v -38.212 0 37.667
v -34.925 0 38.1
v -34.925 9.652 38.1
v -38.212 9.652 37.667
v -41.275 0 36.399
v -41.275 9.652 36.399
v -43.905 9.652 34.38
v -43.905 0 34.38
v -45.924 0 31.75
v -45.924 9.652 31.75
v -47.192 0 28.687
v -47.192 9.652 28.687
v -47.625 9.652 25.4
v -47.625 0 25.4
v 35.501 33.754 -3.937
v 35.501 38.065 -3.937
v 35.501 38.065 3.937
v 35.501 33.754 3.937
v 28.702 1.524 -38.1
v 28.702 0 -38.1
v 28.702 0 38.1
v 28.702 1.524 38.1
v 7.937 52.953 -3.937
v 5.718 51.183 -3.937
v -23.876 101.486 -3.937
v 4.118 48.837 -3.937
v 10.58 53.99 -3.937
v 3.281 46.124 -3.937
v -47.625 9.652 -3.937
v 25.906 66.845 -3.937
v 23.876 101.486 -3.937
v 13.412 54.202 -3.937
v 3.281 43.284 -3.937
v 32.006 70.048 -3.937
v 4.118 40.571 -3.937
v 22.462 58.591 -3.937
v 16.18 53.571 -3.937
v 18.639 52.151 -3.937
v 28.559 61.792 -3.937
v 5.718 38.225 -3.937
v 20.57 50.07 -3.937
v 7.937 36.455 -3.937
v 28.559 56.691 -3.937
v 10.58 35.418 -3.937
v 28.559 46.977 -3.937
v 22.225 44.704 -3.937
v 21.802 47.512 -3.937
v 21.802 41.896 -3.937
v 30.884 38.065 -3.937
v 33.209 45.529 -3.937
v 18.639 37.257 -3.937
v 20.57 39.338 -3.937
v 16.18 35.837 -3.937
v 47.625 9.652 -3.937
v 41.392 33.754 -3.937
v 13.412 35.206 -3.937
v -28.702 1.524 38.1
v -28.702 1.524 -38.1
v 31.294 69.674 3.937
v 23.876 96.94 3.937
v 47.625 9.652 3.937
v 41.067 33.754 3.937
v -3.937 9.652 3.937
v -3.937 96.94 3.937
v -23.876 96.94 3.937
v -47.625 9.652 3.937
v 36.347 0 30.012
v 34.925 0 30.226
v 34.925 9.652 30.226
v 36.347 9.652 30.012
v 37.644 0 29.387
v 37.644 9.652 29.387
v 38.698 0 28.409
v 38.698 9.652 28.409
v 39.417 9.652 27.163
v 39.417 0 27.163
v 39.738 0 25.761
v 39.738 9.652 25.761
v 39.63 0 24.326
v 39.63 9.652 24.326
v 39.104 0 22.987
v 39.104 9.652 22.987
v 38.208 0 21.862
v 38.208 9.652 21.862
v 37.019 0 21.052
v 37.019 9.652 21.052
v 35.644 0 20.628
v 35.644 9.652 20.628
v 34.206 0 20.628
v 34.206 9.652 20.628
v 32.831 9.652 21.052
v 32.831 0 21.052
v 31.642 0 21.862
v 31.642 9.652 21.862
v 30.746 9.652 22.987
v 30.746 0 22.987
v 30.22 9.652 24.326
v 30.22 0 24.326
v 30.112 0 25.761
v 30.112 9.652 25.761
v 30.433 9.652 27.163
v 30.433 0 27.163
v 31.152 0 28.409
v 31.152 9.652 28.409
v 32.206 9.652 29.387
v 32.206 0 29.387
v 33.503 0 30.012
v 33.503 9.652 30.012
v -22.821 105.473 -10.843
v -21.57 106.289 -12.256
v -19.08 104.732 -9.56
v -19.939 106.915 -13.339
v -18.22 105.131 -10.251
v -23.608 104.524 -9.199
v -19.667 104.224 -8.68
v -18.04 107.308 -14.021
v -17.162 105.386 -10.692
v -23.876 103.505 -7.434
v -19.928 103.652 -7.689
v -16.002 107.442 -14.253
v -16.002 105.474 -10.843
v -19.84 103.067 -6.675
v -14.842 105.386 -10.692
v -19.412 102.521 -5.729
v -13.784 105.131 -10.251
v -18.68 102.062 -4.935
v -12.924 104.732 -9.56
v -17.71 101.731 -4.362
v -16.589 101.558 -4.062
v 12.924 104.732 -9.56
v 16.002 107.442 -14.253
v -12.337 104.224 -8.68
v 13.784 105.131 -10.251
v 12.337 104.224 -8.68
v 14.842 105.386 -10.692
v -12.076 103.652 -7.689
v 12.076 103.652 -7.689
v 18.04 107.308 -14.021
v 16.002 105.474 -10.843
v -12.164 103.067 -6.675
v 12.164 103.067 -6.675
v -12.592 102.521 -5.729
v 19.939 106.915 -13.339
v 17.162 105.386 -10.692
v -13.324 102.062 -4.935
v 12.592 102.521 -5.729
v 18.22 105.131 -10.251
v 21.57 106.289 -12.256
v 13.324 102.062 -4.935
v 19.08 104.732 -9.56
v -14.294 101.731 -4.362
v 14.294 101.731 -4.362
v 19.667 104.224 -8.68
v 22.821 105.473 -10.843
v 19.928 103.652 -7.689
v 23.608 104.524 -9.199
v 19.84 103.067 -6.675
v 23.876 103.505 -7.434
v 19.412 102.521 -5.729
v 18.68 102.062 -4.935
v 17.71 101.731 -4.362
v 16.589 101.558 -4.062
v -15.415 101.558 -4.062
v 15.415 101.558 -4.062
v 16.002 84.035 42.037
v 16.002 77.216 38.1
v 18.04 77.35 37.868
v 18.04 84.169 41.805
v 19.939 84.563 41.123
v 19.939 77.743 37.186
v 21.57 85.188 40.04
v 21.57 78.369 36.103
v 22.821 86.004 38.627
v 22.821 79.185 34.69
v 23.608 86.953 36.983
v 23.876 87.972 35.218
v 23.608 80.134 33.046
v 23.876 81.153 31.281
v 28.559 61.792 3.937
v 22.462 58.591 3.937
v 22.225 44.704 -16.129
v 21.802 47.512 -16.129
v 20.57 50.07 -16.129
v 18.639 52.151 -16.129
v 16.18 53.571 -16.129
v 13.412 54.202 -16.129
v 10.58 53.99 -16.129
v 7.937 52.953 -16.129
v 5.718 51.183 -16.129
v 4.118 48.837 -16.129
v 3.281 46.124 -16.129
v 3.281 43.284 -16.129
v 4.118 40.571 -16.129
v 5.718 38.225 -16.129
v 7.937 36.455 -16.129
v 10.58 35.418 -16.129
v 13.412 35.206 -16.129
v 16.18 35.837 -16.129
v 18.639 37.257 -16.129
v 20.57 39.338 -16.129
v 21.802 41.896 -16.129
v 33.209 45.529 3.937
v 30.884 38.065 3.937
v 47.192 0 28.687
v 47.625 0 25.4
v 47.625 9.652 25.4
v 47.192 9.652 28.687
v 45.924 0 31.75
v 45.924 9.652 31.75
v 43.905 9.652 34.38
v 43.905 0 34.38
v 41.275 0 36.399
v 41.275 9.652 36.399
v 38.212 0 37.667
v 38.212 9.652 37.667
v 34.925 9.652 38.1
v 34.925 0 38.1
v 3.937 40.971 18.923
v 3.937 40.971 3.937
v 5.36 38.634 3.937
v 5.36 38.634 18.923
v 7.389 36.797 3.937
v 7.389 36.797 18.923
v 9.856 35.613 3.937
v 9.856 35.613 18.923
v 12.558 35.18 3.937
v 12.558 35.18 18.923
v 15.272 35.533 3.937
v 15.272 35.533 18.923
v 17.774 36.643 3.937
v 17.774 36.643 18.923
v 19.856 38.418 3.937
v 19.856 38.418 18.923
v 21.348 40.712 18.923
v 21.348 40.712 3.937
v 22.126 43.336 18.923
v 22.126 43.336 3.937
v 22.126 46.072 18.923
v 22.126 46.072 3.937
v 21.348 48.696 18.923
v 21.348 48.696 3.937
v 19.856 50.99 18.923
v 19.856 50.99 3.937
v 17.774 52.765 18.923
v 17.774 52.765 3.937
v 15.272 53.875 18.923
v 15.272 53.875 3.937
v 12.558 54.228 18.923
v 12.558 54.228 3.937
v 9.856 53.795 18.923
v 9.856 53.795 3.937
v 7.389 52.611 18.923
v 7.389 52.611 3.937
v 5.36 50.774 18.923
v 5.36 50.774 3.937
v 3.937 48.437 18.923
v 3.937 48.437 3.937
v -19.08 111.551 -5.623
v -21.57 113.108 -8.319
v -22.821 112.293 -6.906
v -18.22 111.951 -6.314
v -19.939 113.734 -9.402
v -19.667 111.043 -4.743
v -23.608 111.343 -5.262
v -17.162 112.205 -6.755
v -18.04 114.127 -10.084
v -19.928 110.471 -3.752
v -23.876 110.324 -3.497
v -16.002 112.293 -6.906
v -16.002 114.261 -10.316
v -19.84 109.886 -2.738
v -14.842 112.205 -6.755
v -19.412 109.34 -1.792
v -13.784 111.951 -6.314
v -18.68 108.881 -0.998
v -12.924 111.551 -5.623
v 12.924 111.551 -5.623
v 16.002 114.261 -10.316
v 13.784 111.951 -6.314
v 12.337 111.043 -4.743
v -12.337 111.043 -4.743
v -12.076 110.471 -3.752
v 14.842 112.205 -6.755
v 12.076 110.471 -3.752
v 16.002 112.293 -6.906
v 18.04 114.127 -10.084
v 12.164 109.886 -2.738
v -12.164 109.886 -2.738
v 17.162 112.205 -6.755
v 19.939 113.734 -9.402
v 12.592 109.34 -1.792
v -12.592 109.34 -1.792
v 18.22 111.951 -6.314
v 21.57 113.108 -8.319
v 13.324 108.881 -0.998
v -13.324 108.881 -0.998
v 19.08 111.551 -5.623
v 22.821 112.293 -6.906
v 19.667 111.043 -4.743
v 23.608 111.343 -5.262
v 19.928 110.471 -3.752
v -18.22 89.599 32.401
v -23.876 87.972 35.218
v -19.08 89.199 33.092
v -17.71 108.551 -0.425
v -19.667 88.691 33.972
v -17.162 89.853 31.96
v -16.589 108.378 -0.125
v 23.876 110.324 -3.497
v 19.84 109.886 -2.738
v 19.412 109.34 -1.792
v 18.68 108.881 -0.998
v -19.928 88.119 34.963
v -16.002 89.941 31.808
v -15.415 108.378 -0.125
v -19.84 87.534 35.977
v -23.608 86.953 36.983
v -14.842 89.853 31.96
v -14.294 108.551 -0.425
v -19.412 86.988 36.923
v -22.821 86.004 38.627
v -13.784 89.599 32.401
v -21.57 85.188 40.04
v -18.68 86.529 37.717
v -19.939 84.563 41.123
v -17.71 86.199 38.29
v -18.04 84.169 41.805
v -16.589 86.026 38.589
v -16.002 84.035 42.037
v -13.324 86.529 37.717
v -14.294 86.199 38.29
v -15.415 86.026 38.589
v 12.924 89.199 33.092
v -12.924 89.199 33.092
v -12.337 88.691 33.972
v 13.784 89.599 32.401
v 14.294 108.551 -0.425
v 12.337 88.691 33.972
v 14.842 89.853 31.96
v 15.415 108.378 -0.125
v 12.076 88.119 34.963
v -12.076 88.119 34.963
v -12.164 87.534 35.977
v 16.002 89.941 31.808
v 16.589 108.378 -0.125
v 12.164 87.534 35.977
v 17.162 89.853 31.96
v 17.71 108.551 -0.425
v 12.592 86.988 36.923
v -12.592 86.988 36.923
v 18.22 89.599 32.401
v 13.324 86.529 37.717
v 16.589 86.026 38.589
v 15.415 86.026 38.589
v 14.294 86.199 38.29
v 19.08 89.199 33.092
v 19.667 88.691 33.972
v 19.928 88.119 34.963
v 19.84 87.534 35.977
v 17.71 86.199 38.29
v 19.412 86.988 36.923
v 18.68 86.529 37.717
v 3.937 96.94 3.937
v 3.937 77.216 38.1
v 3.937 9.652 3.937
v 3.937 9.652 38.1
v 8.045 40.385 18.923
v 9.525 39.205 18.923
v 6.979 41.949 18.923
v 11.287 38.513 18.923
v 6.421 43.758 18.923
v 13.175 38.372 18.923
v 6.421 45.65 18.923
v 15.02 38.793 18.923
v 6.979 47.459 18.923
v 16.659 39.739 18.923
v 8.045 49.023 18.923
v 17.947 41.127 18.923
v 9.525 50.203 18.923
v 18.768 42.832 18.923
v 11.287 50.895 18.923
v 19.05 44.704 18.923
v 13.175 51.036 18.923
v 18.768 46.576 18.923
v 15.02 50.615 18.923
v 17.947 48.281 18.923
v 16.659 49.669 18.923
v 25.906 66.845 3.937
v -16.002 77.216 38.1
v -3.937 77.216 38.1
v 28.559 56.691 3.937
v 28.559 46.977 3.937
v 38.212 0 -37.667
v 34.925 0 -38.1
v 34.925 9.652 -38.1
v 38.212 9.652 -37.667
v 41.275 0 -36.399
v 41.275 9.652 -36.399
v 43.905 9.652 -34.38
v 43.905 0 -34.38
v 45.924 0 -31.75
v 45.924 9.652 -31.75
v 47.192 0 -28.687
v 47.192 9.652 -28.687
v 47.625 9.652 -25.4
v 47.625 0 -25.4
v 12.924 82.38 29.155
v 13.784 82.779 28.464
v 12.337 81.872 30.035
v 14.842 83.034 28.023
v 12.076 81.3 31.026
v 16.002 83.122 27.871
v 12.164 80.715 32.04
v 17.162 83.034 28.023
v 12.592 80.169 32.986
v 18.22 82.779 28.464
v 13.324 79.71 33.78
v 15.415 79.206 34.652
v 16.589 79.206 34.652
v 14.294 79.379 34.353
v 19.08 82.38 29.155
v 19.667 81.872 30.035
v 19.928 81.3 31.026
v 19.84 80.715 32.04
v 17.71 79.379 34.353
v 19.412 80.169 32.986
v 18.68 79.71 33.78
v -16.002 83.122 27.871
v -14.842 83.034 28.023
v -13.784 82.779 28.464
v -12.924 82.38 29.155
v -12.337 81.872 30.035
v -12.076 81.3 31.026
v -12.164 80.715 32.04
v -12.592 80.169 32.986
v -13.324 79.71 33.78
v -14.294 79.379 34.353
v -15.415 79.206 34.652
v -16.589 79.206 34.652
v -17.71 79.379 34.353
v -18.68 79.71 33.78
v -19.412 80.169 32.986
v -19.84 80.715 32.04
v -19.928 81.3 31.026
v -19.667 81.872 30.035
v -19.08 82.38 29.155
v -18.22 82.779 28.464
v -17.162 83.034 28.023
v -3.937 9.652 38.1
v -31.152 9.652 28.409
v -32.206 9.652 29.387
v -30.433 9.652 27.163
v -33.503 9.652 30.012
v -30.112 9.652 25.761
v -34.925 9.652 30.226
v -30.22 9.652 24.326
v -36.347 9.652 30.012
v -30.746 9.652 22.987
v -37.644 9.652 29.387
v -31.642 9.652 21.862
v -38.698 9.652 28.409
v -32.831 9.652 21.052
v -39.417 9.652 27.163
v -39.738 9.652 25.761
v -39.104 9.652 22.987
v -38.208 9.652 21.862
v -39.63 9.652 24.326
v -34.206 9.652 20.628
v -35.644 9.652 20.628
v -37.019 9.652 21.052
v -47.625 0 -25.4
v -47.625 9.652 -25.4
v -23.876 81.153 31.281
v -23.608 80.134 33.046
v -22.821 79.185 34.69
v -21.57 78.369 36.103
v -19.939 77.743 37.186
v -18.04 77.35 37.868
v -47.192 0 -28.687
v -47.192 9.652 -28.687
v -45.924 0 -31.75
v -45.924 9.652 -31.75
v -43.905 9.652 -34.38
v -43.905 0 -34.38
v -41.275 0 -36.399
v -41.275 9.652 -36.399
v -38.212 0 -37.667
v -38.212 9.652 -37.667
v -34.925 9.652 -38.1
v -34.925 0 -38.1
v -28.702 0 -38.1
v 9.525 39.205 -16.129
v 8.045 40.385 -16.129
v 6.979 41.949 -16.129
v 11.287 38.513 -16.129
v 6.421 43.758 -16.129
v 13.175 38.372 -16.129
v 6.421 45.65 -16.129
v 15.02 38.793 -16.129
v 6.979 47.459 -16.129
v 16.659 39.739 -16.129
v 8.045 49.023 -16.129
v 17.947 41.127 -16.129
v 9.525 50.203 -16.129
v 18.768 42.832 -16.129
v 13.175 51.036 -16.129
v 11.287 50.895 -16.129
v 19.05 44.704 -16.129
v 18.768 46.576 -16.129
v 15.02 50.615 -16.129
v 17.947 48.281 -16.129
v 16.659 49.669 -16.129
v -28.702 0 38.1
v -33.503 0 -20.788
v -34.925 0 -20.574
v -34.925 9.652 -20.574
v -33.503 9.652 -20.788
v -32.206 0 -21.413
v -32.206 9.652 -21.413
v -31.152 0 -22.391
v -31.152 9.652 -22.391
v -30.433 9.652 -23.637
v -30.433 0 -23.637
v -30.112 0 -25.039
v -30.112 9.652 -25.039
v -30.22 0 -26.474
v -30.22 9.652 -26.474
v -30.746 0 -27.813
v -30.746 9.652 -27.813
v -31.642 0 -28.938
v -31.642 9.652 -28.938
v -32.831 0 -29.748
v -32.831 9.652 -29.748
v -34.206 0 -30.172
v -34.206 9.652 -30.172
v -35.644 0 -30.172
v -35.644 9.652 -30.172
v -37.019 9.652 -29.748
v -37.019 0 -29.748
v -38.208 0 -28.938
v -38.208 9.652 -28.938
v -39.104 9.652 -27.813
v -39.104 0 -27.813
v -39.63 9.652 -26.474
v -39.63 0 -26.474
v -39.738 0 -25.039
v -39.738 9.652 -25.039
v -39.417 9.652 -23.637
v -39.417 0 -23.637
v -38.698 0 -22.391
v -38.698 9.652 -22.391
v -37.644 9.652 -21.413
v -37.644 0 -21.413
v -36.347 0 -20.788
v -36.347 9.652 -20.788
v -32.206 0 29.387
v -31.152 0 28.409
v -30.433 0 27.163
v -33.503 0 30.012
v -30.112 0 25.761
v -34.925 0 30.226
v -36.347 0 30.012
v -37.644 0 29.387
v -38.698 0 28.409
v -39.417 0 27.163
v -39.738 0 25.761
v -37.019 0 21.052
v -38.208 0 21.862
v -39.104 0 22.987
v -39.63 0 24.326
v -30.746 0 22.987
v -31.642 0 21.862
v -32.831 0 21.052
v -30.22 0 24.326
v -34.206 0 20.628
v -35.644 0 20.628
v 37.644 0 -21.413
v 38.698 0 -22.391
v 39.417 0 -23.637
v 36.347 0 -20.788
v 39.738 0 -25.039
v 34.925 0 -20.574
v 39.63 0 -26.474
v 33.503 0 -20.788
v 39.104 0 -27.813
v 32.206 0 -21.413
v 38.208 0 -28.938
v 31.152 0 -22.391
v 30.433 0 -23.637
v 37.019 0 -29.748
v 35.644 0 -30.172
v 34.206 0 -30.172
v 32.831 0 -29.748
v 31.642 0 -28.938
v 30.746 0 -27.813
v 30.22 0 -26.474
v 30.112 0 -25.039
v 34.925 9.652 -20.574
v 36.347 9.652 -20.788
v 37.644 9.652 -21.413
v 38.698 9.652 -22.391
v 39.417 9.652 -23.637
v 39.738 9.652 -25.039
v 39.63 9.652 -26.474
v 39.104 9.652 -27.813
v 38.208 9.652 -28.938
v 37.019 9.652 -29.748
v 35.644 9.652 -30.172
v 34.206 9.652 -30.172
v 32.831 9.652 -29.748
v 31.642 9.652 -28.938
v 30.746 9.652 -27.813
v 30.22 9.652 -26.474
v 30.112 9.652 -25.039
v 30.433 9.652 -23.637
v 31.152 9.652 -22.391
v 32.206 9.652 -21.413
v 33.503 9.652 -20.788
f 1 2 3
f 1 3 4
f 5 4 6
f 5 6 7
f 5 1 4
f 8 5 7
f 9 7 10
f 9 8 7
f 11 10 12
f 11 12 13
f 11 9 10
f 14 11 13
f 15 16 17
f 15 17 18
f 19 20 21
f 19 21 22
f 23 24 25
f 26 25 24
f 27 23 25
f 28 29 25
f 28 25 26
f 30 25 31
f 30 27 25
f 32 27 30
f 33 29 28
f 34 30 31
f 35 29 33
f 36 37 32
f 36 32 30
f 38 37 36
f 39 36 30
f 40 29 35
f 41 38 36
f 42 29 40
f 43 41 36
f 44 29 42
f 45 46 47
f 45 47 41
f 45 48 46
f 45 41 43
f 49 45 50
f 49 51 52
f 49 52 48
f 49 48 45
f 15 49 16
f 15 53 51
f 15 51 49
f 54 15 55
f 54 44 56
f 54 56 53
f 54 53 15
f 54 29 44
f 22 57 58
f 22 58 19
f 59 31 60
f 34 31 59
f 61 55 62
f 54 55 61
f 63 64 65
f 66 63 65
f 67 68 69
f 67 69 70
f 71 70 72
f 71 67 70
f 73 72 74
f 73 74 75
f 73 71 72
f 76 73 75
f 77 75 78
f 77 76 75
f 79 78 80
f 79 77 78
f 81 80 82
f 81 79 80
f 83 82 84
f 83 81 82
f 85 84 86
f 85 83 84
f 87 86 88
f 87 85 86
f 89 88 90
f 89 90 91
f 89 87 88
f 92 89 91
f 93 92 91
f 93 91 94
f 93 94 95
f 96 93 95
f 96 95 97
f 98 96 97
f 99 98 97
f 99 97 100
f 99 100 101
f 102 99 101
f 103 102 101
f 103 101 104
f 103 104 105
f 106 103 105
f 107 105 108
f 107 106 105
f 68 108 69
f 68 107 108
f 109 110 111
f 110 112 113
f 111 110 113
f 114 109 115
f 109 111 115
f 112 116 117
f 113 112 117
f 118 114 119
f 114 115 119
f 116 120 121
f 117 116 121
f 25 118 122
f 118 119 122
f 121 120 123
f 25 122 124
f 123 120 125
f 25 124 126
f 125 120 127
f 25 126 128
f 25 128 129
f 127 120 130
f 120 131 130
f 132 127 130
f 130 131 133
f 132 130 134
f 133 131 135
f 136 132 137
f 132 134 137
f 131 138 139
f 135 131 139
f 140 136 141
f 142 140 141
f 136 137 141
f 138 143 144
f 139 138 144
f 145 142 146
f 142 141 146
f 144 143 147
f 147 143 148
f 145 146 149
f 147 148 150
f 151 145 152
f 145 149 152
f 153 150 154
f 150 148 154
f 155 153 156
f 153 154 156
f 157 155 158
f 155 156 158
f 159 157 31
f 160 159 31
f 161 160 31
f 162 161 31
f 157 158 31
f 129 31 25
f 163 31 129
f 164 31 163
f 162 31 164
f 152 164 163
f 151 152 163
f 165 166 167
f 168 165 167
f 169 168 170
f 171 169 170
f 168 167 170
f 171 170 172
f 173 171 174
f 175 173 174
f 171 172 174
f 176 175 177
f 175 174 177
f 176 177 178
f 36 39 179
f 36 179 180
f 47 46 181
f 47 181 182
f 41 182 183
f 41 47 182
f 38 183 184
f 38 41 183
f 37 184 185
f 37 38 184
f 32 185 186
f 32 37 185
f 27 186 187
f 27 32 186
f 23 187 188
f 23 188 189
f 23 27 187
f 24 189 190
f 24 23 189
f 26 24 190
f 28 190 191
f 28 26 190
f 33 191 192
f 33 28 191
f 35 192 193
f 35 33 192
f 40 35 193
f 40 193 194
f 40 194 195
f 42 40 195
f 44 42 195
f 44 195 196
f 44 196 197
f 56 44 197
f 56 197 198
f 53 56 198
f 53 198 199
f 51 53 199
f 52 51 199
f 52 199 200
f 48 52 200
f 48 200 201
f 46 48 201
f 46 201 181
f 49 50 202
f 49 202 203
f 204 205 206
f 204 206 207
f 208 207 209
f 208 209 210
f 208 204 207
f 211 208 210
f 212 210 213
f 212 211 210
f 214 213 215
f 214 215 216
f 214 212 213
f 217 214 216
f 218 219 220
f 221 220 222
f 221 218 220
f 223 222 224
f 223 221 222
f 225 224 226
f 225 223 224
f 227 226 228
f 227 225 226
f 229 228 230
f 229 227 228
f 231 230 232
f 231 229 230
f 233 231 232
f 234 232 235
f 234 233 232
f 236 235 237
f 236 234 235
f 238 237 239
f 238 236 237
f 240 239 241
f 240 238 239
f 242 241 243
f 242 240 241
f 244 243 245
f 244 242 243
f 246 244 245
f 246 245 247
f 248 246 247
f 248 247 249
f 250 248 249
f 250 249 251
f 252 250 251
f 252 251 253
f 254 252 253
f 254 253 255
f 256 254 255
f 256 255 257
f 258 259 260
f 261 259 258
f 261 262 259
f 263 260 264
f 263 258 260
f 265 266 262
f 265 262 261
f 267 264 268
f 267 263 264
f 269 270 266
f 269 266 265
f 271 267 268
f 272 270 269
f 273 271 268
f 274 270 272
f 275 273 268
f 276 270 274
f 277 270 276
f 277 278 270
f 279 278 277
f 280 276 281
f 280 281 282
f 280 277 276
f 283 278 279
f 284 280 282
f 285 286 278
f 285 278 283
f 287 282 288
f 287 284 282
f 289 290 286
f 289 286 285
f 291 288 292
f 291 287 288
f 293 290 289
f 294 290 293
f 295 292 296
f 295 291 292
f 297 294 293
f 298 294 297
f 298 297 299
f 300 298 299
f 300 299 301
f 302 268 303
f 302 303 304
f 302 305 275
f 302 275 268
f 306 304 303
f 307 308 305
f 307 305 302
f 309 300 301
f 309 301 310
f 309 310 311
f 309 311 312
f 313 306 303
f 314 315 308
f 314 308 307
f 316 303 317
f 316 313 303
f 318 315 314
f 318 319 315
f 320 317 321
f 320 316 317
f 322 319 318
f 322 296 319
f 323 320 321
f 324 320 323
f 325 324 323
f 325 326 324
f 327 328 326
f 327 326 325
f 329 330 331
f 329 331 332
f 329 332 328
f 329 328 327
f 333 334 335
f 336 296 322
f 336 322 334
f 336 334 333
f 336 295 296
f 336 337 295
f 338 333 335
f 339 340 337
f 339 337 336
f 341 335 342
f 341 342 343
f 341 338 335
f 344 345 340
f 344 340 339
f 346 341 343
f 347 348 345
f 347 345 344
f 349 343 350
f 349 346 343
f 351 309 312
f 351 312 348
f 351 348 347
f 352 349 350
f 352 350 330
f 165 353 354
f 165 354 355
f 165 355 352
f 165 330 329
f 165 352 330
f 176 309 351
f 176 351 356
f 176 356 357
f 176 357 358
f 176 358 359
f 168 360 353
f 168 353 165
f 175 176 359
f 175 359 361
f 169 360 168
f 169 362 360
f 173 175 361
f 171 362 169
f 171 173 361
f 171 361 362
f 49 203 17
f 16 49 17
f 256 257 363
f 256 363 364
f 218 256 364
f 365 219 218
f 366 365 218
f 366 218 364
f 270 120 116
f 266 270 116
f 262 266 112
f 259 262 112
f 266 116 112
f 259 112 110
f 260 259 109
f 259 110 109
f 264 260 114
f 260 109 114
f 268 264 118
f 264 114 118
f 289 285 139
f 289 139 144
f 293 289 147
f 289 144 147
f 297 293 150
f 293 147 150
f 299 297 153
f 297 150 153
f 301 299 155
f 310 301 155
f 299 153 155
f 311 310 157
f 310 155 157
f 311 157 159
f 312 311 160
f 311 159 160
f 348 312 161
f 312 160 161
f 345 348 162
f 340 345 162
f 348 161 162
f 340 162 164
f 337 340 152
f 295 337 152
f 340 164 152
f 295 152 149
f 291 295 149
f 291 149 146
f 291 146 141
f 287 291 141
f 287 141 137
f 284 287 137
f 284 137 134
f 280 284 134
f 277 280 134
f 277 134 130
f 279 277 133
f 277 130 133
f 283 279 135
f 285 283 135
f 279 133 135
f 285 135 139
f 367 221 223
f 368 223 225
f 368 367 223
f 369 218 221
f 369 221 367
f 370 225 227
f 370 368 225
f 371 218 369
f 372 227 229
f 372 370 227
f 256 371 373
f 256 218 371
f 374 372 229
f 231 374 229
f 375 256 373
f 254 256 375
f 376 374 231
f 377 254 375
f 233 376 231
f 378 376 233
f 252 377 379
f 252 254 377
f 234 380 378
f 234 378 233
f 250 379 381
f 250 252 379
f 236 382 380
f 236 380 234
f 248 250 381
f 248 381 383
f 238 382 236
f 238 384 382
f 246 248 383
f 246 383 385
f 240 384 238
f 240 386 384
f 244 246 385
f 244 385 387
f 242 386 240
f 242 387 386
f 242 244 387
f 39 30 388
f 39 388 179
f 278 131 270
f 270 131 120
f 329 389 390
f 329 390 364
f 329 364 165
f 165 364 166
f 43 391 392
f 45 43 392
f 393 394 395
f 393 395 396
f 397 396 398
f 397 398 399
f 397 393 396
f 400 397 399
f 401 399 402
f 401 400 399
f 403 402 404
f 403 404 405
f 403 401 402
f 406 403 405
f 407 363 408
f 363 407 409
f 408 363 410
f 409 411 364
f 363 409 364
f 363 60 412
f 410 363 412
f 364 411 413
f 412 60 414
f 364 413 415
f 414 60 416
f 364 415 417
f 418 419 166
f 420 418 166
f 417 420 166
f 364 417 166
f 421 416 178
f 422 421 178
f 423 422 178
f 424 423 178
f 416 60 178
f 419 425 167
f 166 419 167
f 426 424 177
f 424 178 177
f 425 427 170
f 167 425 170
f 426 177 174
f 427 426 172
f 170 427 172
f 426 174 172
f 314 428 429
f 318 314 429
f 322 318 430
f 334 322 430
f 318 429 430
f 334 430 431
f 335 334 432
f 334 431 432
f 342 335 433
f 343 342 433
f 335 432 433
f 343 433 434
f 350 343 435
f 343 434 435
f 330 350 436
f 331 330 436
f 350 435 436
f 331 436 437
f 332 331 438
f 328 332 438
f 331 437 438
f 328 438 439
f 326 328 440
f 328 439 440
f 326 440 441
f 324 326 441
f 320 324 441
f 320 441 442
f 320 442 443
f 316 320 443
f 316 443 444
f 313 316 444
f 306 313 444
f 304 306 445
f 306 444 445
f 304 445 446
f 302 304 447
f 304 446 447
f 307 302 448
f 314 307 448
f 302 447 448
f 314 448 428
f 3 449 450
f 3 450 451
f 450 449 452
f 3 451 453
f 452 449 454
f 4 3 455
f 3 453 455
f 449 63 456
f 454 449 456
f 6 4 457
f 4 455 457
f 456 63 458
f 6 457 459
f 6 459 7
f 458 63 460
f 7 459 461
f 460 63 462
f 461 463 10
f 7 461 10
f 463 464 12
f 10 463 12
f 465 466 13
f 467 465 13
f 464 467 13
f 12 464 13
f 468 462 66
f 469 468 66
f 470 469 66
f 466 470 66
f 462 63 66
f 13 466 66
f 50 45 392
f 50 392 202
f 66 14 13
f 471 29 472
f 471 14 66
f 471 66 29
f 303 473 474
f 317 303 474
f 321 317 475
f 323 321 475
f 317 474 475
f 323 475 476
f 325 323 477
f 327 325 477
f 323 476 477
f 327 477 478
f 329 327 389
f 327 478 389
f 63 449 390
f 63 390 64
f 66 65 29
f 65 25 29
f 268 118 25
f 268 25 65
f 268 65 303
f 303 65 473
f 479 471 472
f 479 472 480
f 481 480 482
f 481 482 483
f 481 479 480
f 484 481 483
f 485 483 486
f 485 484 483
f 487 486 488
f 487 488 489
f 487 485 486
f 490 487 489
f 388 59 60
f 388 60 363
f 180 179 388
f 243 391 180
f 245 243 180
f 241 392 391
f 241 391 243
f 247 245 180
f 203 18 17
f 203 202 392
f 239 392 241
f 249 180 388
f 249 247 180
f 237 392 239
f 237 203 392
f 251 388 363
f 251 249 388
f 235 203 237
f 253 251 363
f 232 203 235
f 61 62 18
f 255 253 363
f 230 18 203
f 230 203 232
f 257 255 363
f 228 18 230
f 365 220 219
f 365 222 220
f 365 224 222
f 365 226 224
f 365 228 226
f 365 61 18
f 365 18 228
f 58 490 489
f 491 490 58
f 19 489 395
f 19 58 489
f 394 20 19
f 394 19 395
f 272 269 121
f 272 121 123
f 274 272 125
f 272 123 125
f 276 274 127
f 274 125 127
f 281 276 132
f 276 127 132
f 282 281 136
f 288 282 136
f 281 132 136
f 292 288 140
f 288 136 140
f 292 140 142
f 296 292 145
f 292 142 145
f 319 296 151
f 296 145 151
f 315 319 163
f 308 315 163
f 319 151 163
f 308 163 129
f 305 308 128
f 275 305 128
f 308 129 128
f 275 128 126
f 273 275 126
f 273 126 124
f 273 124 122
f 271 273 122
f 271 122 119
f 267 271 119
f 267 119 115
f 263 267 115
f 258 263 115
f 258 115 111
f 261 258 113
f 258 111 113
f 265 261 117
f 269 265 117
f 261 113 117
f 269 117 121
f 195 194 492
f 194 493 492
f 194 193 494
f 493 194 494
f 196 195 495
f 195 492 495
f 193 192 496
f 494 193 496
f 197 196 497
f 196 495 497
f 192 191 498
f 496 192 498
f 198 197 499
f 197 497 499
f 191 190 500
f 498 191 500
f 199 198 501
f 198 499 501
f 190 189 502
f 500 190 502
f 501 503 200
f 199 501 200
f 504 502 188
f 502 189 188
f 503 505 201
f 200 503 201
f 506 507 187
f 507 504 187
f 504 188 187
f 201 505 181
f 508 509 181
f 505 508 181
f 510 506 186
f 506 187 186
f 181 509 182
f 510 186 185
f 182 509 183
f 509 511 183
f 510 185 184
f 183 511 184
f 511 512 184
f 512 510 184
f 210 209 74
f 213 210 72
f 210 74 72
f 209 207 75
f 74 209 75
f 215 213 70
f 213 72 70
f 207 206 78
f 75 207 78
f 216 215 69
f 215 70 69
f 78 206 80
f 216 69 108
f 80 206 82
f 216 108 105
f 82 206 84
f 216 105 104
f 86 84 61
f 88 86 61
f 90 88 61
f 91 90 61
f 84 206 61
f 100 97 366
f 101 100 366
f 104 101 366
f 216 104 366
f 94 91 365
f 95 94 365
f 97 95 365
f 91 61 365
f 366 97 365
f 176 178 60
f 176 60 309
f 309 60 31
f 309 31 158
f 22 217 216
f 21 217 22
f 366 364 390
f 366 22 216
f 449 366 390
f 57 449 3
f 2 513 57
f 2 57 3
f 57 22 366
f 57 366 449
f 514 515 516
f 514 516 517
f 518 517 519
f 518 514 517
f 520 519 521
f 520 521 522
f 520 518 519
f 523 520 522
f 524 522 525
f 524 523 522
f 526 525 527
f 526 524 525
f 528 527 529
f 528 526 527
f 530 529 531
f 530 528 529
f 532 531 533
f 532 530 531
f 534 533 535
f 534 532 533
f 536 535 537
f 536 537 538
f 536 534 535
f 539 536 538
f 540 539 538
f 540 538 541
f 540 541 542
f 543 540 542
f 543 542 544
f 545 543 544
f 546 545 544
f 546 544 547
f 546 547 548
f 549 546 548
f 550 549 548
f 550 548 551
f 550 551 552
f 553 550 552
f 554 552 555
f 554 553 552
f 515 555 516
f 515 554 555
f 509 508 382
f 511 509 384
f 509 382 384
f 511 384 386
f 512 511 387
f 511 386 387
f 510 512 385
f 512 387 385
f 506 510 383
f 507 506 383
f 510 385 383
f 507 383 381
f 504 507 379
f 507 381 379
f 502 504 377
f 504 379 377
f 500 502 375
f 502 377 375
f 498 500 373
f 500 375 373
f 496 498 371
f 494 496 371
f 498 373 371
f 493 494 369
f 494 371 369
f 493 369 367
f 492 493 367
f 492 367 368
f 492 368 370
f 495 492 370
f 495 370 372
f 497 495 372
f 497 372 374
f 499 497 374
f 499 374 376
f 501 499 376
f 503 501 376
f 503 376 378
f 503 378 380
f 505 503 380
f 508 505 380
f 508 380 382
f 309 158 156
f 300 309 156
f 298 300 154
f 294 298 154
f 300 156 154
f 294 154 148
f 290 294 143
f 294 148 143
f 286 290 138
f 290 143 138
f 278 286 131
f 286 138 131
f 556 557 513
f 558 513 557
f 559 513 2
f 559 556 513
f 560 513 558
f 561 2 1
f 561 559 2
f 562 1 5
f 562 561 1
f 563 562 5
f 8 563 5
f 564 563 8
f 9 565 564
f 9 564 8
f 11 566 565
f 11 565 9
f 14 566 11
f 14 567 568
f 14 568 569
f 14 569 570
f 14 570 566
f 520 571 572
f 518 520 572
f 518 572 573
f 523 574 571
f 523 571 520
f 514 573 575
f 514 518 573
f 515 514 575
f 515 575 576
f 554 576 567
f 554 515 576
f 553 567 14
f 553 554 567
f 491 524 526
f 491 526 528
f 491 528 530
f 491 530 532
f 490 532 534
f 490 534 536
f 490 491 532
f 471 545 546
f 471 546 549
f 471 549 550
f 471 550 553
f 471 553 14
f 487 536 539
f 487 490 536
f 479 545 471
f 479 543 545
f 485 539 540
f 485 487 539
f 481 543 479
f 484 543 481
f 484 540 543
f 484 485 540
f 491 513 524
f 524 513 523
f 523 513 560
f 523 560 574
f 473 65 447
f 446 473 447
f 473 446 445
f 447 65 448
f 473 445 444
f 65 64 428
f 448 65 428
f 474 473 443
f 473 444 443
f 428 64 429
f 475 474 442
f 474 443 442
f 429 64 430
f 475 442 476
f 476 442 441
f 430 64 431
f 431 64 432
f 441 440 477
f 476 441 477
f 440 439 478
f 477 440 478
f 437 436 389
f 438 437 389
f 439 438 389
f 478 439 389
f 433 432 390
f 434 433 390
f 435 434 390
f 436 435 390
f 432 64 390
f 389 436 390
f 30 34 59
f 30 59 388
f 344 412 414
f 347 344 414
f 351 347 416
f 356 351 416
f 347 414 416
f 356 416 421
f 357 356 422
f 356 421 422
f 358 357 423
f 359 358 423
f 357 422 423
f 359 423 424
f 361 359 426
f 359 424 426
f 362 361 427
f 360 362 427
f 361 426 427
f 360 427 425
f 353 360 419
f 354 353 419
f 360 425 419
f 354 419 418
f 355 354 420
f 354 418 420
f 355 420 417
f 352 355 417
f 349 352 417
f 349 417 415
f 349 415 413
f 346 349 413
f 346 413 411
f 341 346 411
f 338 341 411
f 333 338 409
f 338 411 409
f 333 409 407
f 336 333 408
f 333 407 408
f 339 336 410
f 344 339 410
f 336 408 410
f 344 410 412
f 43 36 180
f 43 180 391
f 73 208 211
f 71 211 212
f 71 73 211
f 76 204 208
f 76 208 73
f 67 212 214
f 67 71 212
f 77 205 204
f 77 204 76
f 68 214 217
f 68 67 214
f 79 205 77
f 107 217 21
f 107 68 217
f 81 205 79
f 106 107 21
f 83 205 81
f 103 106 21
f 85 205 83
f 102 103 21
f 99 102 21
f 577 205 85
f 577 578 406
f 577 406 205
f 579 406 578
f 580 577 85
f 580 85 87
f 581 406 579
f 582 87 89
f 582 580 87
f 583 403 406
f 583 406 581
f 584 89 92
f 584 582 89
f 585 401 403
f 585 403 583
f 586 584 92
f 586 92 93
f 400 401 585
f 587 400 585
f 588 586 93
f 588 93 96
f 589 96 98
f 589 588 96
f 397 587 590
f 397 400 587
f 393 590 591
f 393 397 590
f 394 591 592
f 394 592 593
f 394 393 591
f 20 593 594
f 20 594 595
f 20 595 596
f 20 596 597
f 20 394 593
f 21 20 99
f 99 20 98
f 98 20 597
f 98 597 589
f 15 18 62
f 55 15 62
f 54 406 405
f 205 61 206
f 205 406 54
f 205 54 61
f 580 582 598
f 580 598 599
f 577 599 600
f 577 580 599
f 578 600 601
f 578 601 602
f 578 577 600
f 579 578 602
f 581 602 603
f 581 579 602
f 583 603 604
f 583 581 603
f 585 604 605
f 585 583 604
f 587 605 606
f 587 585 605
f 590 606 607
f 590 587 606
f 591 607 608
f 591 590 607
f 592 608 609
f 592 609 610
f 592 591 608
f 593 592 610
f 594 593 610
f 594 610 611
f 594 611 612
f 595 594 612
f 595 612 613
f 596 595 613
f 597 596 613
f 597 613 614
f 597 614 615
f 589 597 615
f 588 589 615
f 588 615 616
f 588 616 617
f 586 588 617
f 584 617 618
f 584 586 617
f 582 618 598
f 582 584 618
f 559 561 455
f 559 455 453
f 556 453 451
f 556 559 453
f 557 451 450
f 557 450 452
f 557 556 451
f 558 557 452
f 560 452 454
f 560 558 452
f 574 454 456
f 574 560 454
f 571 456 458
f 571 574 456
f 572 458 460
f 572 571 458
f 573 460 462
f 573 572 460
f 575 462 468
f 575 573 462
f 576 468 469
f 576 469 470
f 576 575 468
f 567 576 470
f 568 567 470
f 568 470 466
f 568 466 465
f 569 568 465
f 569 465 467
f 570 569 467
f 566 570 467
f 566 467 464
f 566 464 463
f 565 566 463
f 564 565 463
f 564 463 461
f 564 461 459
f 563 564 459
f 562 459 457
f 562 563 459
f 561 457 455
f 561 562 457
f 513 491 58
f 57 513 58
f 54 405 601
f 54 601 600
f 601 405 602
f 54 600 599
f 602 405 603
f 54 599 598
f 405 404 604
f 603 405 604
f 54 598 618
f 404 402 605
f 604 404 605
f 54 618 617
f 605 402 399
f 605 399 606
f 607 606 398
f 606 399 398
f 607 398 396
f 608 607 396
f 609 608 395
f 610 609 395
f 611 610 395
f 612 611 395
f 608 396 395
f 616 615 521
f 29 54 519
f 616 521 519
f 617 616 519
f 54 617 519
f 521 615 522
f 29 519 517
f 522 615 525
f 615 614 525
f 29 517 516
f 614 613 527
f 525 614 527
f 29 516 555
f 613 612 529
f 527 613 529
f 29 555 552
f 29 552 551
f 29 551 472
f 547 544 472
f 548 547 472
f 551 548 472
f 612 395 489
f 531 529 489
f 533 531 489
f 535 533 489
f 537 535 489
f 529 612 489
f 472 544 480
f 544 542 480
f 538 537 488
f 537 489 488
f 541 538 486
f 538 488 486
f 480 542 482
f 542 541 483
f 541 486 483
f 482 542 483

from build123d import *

# Parameters (mm, degrees)
CROQUIS1_R              = 4.826
SALIENTE_EXTRUIR1_DEPTH = 9.652
CROQUIS2_W              = 57.404
CROQUIS2_H              = 1.524
CORTAR_EXTRUIR1_DEPTH   = 91.375559356
CROQUIS4_R              = 3.937
SALIENTE_EXTRUIR2_DEPTH = 7.874
SALIENTE_EXTRUIR3_REACH = 207.578
SALIENTE_EXTRUIR4_START = 14.986
CROQUIS8_R              = 9.525
CROQUIS8_R_2            = 6.35
SALIENTE_EXTRUIR4_DEPTH = 35.052
CROQUIS8_2_R            = 6.35
CORTAR_EXTRUIR2_DEPTH   = 131.731959853
CORTAR_EXTRUIR3_DEPTH   = 131.731959853


with BuildPart() as part:
    # Croquis1 → Saliente-Extruir1 (new body)
    with BuildSketch(Plane(origin=(0, 0, 0), x_dir=(1, 0, 0), z_dir=(0, 1, 0))):
        with BuildLine():
            Line((-34.925, 38.1), (34.925, 38.1))
            ThreePointArc((34.925, 38.1), (43.905256121, 34.380256121), (47.625, 25.4))
            Line((47.625, 25.4), (47.625, -25.4))
            ThreePointArc((47.625, -25.4), (43.905256121, -34.380256121), (34.925, -38.1))
            Line((34.925, -38.1), (-34.925, -38.1))
            ThreePointArc((-34.925, -38.1), (-43.905256121, -34.380256121), (-47.625, -25.4))
            Line((-47.625, -25.4), (-47.625, 25.4))
            ThreePointArc((-47.625, 25.4), (-43.905256121, 34.380256121), (-34.925, 38.1))
        make_face()
        with Locations((-34.925, 25.4)):
            Circle(CROQUIS1_R, mode=Mode.SUBTRACT)
        with Locations((34.925, 25.4)):
            Circle(CROQUIS1_R, mode=Mode.SUBTRACT)
        with Locations((-34.925, -25.4)):
            Circle(CROQUIS1_R, mode=Mode.SUBTRACT)
        with Locations((34.925, -25.4)):
            Circle(CROQUIS1_R, mode=Mode.SUBTRACT)
    extrude(amount=SALIENTE_EXTRUIR1_DEPTH)

    # Croquis2 → Cortar-Extruir1 (cut, through all)
    with BuildSketch(Plane.XY.offset(38.1)):
        with Locations((0, 0.762)):
            Rectangle(CROQUIS2_W, CROQUIS2_H)
    extrude(amount=-CORTAR_EXTRUIR1_DEPTH, mode=Mode.SUBTRACT)



with BuildPart() as body_2:
    # Croquis4 → Saliente-Extruir2 (new body)
    with BuildSketch(Plane(origin=(0, 74.409783942, 42.960508789), x_dir=(0, 0.5000000000000009, -0.866025403784438), z_dir=(0, -0.8660254037844382, -0.500000000000001))):
        with BuildLine():
            Line((58.190432116, -23.876), (13.486432116, -23.876))
            ThreePointArc((13.486432116, -23.876), (7.918673321, -21.569758795), (5.612432116, -16.002))
            Line((5.612432116, -16.002), (5.612432116, 16.002))
            ThreePointArc((5.612432116, 16.002), (7.918673321, 21.569758795), (13.486432116, 23.876))
            Line((13.486432116, 23.876), (58.190432116, 23.876))
            ThreePointArc((58.190432116, 23.876), (63.758190911, 21.569758795), (66.064432116, 16.002))
            Line((66.064432116, 16.002), (66.064432116, -16.002))
            ThreePointArc((66.064432116, -16.002), (63.758190911, -21.569758795), (58.190432116, -23.876))
        make_face()
        with Locations((58.190432116, -16.002)):
            Circle(CROQUIS4_R, mode=Mode.SUBTRACT)
        with Locations((13.486432116, 16.002)):
            Circle(CROQUIS4_R, mode=Mode.SUBTRACT)
        with Locations((13.486432116, -16.002)):
            Circle(CROQUIS4_R, mode=Mode.SUBTRACT)
        with Locations((58.190432116, 16.002)):
            Circle(CROQUIS4_R, mode=Mode.SUBTRACT)
    extrude(amount=-SALIENTE_EXTRUIR2_DEPTH)


with BuildPart() as part_1:
    add(part.part)

    add(body_2.part)  # Saliente-Extruir3 merges body 2
    # Saliente-Extruir3: up to this plane
    saliente_extruir3_end = Plane(origin=(16.002, 103.505, -7.43388368), z_dir=(0, -0.866025403784438, -0.5000000000000009))
    # Croquis5 → Saliente-Extruir3 (add, up to the surface)
    with BuildSketch(Plane(origin=(0, 9.652, 0), x_dir=(1, 0, 0), z_dir=(0, 1, 0)), mode=Mode.PRIVATE) as saliente_extruir3_sk1:
        Polygon((-47.625, 3.937), (47.625, 3.937), (47.625, -3.937), (3.937, -3.937), (3.937, -38.1), (-3.937, -38.1), (-3.937, -3.937), (-47.625, -3.937), align=None)
    saliente_extruir3_tool1 = split(extrude(saliente_extruir3_sk1.sketch, amount=SALIENTE_EXTRUIR3_REACH, mode=Mode.PRIVATE), bisect_by=saliente_extruir3_end, keep=Keep.BOTH, mode=Mode.PRIVATE)
    add(saliente_extruir3_tool1.solids().sort_by_distance((0, 9.652, 5.548554))[0])

    # Croquis6 → Cortar-Recubrir2 section 0
    with BuildSketch(Plane.XY.offset(3.937)):
        with BuildLine():
            Line((23.876, 96.940017246), (47.625, 9.652))
            Line((47.625, 9.652), (47.625, 96.940017246))
            Line((47.625, 96.940017246), (23.876, 96.940017246))
        make_face()
    # Croquis7 → Cortar-Recubrir2 section 1
    with BuildSketch(Plane(origin=(0, 0, -3.937), x_dir=(-1, 0, 0), z_dir=(0, 0, -1))):
        with BuildLine():
            Line((-23.876, 101.486073266), (-47.625, 9.652))
            Line((-47.625, 9.652), (-47.625, 101.486073266))
            Line((-47.625, 101.486073266), (-23.876, 101.486073266))
        make_face()
    cortar_recubrir2 = loft(mode=Mode.SUBTRACT)

    # Simetría1: Cortar-Recubrir2 across plane
    add(cortar_recubrir2.mirror(Plane(origin=(0, 0, 0), x_dir=(0, 0, 1), z_dir=(1, 0, 0))), mode=Mode.SUBTRACT)

    # Croquis8 → Saliente-Extruir4 (add)
    with BuildSketch(Plane.XY.offset(3.937).offset(SALIENTE_EXTRUIR4_START)):
        with Locations((12.7, 44.704)):
            Circle(CROQUIS8_R)
        with Locations((12.7, 44.704)):
            Circle(CROQUIS8_R_2, mode=Mode.SUBTRACT)
    extrude(amount=-SALIENTE_EXTRUIR4_DEPTH)

    # Croquis8<2> → Cortar-Extruir2 (cut, through all)
    with BuildSketch(Plane.XY.offset(3.937)):
        with Locations((12.7, 44.704)):
            Circle(CROQUIS8_2_R)
    extrude(amount=-CORTAR_EXTRUIR2_DEPTH, mode=Mode.SUBTRACT)

    # Croquis9 → Cortar-Extruir3 (cut, through all)
    with BuildSketch(Plane.XY.offset(3.937)):
        Polygon((35.501063323, 71.882673058), (25.906181344, 66.845360019), (28.559347202, 61.791710765), (22.462060614, 58.590635306), (28.559347202, 56.691480467), (28.559347202, 46.97675609), (33.208528226, 45.528650525), (30.883937714, 38.065491513), (35.501063323, 38.065491513), (35.501063323, 33.754439669), (44.724683108, 33.754439669), align=None)
    extrude(amount=-CORTAR_EXTRUIR3_DEPTH, mode=Mode.SUBTRACT)


solid = part_1.part
